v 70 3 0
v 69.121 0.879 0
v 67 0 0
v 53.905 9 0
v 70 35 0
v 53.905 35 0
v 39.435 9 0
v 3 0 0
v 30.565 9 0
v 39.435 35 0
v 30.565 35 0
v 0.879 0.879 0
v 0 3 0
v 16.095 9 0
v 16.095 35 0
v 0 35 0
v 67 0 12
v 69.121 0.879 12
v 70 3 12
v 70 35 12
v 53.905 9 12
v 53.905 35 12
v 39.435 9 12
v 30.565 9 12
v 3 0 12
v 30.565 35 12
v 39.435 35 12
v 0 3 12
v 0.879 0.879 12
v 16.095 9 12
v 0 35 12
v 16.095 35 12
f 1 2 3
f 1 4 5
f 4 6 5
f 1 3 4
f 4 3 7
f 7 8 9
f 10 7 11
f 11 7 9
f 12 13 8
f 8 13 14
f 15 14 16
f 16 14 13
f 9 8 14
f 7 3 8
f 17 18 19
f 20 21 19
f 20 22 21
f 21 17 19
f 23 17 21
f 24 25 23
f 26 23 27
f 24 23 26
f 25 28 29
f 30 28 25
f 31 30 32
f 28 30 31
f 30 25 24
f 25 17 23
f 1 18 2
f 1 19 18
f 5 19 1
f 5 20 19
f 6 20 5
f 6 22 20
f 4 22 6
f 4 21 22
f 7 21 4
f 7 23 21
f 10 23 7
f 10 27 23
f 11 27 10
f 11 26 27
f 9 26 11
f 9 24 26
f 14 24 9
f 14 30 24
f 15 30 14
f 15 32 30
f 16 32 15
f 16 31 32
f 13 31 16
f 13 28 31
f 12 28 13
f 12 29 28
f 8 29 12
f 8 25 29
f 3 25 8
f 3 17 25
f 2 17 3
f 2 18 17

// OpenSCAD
$fn = 32;

// ----------------------------------------------------------------------
// Window plate: 70 x 35 mm, 2 open windows
// ----------------------------------------------------------------------

// --- parameters (mm) ---
profile_height = 12;      // extrusion height
profile_points = 16;      // points of the closed outline

profile = [[0, 3], [0.879, 0.879], [3, 0], [67, 0], [69.121, 0.879], [70, 3], [70, 35], [53.905, 35], [53.905, 9], [39.435, 9], [39.435, 35], [30.565, 35], [30.565, 9], [16.095, 9], [16.095, 35], [0, 35]];  // single closed polygon, 16 points, counter clockwise

// --- the one profile operation ---
linear_extrude(height = profile_height) polygon(points = profile);
